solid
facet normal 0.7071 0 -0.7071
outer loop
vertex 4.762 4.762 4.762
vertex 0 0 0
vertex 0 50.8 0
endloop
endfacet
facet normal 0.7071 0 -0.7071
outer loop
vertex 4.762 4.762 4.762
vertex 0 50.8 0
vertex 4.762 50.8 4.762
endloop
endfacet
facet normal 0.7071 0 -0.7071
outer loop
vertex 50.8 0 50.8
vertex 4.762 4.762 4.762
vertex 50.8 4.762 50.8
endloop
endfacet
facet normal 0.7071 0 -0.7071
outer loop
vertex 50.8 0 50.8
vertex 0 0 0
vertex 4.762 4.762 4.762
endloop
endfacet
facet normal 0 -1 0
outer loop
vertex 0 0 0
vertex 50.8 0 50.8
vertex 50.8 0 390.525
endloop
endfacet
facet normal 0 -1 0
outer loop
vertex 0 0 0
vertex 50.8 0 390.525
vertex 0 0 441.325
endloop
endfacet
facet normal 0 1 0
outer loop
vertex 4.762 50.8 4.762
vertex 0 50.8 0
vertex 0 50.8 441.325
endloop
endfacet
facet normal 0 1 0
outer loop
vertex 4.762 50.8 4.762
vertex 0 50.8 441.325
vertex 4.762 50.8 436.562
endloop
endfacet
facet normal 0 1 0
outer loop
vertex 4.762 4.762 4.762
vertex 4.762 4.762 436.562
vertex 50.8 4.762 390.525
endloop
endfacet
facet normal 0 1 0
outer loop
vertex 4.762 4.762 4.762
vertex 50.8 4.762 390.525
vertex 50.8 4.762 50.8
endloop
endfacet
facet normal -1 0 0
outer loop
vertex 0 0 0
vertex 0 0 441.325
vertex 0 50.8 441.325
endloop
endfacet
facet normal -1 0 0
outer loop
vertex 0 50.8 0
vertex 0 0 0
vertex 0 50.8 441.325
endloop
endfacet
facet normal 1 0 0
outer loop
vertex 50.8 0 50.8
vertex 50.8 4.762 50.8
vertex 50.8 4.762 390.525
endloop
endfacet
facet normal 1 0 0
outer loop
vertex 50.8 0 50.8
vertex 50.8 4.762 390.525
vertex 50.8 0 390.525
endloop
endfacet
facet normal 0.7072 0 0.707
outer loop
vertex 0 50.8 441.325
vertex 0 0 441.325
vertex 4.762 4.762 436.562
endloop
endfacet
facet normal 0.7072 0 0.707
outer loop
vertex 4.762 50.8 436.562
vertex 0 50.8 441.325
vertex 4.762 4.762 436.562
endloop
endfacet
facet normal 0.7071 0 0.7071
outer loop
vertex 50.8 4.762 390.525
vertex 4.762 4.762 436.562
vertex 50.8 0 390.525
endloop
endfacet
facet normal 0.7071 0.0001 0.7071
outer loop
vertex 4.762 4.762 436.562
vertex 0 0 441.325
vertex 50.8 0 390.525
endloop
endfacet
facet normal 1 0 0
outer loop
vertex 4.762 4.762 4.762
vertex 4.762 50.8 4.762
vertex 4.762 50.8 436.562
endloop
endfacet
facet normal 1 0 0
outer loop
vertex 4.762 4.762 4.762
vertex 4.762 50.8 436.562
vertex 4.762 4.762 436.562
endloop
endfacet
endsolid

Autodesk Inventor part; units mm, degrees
ref_plane "YZ Plane" through (0, 0, 0) normal (1, 0, 0) x (0, 1, 0)
ref_plane "XZ Plane" through (0, 0, 0) normal (0, 1, 0) x (-1, 0, 0)
ref_plane "XY Plane" through (0, 0, 0) normal (0, 0, 1) x (1, 0, 0)
sketch "Sketch1" plane through (0, 0, 0) normal (0, 0, 1) x (1, 0, 0)
  line L0 (0, 0) -> (0, 50.8)
  line L1 (0, 50.8) -> (4.7625, 50.8)
  line L2 (4.7625, 50.8) -> (4.7625, 4.7625)
  line L3 (4.7625, 4.7625) -> (50.8, 4.7625)
  line L4 (50.8, 4.7625) -> (50.8, 0)
  line L5 (50.8, 0) -> (0, 0)
  dimension "d0" = 4.7625
  dimension "d1" = 50.8
  dimension "d2" = 4.7625
  dimension "d3" = 50.8
extrude "Extrusion1" add sketch "Sketch1" along normal blind 441.325
sketch "Sketch5" plane through (0, 0, 0) normal (0, -1, 0) x (1, 0, 0)
  line L0 (50.8, 441.325) -> (0, 441.325) projected
  line L1 (50.8, 0) -> (0, 0) projected
  line L2 (50.8, 0) -> (50.8, 441.325) projected
  line L3 (0, 441.325) -> (50.8, 390.525)
  line L4 (0, 0) -> (50.8, 50.8)
  dimension "d16" = 45
  dimension "d17" = 45
extrude "Extrusion5" cut sketch "Sketch5" against normal blind 50.8 contours L2 L3 L0
sketch "Sketch6" plane through (0, 0, 0) normal (0, -1, 0) x (1, 0, 0)
  line L0 (0, 0) -> (0, 441.325) projected
  line L1 (50.8, 0) -> (0, 0) projected
  line L2 (50.8, 0) -> (50.8, 390.525) projected
  line L3 (0, 0) -> (50.8, 50.8)
  dimension "d20" = 45
extrude "Extrusion6" cut sketch "Sketch6" against normal blind 50.8
properties part number "BOXC_L17P5"
